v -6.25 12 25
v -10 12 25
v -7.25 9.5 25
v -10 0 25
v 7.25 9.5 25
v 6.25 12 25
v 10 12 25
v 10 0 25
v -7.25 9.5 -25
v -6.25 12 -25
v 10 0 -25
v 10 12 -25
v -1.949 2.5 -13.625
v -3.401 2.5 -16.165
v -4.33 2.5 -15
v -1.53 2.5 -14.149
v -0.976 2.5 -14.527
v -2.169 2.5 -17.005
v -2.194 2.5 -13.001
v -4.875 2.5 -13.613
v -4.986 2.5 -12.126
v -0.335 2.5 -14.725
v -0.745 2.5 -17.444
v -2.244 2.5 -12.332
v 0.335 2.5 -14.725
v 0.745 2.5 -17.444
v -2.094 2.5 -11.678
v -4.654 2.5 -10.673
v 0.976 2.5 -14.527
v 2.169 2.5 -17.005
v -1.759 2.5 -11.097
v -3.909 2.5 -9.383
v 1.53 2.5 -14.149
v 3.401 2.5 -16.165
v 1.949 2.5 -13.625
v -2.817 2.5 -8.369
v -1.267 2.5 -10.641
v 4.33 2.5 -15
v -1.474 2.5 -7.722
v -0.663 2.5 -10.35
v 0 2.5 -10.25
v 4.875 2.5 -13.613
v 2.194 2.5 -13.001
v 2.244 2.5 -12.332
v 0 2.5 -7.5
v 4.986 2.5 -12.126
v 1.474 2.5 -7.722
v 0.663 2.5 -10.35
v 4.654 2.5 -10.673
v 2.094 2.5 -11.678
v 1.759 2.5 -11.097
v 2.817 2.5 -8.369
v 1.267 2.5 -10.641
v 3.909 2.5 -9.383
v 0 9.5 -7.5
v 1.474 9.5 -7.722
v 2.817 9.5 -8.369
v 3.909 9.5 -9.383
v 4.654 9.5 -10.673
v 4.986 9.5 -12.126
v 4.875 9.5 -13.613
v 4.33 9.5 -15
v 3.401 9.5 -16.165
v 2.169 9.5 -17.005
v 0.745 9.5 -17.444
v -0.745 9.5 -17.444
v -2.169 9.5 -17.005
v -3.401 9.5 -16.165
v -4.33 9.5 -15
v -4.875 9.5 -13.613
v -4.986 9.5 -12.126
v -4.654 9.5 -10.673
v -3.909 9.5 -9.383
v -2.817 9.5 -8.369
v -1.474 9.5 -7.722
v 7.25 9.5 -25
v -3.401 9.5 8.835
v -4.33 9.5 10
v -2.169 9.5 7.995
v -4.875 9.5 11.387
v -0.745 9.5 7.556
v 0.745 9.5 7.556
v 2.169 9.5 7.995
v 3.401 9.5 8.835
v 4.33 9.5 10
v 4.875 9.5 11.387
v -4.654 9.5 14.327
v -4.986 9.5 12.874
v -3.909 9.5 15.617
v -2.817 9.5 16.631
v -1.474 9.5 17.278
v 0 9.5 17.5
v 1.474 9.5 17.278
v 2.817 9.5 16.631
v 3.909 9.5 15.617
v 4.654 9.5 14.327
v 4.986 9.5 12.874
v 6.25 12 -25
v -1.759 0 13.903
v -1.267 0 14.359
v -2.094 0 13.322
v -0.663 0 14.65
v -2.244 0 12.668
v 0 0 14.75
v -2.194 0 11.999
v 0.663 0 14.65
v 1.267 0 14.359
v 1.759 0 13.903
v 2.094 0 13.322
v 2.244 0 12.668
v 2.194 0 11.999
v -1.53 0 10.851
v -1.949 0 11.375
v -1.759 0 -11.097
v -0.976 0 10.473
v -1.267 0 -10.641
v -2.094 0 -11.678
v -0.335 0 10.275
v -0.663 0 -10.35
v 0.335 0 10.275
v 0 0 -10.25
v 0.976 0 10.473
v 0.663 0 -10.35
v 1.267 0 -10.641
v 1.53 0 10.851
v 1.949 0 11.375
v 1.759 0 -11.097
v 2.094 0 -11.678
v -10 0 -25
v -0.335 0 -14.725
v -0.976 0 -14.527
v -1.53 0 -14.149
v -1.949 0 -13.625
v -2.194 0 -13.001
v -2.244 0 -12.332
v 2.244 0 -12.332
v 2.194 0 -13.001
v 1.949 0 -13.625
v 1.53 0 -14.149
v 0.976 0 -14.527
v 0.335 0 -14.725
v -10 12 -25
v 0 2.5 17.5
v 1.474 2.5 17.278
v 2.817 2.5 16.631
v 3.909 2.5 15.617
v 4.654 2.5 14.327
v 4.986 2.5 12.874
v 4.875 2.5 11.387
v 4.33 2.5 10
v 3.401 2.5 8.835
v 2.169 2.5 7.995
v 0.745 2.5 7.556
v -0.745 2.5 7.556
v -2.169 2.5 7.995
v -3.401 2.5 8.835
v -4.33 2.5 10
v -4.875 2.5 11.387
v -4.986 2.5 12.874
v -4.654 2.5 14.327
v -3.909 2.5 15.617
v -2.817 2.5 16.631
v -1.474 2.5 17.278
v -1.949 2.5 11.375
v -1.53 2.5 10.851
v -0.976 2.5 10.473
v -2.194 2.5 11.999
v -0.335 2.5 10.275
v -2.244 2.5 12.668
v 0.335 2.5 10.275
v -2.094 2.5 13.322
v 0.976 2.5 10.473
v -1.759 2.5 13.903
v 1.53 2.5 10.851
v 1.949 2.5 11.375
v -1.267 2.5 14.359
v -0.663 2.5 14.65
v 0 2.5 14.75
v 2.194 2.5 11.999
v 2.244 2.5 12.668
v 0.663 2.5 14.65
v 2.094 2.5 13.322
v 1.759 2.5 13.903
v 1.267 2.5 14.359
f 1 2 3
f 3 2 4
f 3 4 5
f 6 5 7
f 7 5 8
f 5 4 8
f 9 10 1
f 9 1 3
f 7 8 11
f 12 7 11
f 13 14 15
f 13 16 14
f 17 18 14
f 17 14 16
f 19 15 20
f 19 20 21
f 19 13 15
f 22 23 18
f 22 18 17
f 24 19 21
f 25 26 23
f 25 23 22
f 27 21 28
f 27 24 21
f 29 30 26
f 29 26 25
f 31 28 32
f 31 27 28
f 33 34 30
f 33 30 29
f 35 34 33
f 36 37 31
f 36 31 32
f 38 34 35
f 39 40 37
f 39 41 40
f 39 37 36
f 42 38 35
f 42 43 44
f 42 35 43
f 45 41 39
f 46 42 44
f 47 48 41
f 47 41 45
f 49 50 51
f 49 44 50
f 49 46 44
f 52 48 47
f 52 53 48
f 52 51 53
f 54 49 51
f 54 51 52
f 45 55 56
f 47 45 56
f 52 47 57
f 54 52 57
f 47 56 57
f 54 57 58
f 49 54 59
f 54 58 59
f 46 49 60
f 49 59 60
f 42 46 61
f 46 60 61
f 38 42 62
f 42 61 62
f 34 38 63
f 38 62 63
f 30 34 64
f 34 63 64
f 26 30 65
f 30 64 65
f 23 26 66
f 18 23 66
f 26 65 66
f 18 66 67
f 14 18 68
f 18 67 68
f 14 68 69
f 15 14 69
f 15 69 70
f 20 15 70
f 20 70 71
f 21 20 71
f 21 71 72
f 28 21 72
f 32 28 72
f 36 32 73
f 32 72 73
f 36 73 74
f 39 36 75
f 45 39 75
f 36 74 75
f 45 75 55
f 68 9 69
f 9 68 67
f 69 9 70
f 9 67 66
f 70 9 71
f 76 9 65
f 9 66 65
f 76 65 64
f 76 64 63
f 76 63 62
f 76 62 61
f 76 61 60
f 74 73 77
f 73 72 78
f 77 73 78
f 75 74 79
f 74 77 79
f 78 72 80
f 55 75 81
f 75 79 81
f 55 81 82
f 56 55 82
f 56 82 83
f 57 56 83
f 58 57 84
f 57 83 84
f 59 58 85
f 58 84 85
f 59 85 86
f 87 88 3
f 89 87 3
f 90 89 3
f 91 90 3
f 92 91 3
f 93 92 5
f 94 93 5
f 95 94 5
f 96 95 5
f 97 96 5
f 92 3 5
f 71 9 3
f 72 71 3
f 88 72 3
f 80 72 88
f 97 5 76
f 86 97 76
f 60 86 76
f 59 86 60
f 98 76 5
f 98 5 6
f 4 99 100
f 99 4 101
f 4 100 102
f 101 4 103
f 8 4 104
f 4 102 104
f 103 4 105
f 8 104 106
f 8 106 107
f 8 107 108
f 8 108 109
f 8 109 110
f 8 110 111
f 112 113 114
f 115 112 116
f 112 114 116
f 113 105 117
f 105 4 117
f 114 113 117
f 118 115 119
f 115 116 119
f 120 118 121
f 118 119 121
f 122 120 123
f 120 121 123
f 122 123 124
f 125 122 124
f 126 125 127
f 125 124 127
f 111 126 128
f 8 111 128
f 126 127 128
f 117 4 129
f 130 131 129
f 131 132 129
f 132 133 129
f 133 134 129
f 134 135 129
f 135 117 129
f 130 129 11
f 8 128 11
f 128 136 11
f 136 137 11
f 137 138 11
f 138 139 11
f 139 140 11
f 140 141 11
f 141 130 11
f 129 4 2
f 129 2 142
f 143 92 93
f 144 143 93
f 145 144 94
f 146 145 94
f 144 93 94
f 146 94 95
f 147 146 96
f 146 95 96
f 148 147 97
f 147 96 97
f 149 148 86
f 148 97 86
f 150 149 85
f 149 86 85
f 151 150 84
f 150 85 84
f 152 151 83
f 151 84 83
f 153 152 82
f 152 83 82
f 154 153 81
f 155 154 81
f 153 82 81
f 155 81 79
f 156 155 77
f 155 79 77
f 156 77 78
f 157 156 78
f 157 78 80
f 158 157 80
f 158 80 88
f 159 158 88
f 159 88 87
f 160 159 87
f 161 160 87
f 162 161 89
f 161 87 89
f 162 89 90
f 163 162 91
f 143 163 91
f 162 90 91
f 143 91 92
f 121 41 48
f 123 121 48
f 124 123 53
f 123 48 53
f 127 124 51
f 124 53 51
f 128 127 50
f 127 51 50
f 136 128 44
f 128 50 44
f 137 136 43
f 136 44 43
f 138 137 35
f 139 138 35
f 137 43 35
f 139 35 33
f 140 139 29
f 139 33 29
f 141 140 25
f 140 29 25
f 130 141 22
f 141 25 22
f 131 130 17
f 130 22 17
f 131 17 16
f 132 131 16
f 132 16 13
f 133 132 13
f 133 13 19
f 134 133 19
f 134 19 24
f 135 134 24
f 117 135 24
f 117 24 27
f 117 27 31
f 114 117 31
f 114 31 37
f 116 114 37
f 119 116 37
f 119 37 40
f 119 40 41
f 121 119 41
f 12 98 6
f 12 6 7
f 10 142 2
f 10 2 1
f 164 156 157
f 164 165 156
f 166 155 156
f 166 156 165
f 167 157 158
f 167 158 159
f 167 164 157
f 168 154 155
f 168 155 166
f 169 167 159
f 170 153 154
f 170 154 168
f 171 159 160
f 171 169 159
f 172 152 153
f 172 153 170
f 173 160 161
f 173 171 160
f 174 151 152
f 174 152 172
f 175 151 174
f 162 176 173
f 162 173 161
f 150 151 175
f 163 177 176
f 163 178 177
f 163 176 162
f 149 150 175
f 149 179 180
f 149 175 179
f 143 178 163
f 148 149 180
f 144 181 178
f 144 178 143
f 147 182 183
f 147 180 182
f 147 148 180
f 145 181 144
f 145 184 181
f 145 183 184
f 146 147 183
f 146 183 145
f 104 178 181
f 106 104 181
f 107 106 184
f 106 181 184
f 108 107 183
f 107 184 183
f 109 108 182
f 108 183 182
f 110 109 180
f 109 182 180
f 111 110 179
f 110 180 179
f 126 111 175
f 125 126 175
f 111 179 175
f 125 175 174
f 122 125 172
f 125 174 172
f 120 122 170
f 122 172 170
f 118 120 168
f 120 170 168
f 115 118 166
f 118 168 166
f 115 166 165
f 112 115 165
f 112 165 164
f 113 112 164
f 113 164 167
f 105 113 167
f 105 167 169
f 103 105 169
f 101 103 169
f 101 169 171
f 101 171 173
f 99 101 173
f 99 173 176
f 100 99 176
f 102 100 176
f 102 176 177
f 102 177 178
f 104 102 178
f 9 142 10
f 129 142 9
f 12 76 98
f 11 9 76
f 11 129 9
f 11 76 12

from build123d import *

# Parameters (mm, degrees)
SKETCH1_W           = 20
SKETCH1_H           = 50
BOSS_EXTRUDE1_DEPTH = 12
CUT_EXTRUDE1_REACH  = 54.383
SKETCH3_R           = 5
CUT_EXTRUDE3_DEPTH  = 7
CUT_EXTRUDE4_REACH  = 30.553
SKETCH4_R           = 2.25


with BuildPart() as part:
    # Sketch1 → Boss-Extrude1 (new body)
    with BuildSketch(Plane(origin=(0, 0, 0), x_dir=(1, 0, 0), z_dir=(0, 1, 0))):
        Rectangle(SKETCH1_W, SKETCH1_H)
    extrude(amount=BOSS_EXTRUDE1_DEPTH)

    # Sketch2 → Cut-Extrude1 (cut, up to next)
    with BuildSketch(Plane.XY.offset(25), mode=Mode.PRIVATE) as cut_extrude1_sk1:
        Polygon((0, 9.5), (7.25, 9.5), (6.25, 12), (0, 12), (-6.25, 12), (-7.25, 9.5), align=None)
    cut_extrude1_tool1 = extrude(cut_extrude1_sk1.sketch, amount=-CUT_EXTRUDE1_REACH, mode=Mode.PRIVATE) & part.part
    add(cut_extrude1_tool1.solids().sort_by_distance((0, 10.719136, 25))[0], mode=Mode.SUBTRACT)

    # Sketch3 → Cut-Extrude3 (cut)
    with BuildSketch(Plane(origin=(0, 9.5, 0), x_dir=(1, 0, 0), z_dir=(0, 1, 0))):
        with Locations(Location((0, 12.5, 0), (0, 0, 270))):
            Circle(SKETCH3_R)
        with Locations(Location((0, -12.5, 0), (0, 0, 270))):
            Circle(SKETCH3_R)
    extrude(amount=-CUT_EXTRUDE3_DEPTH, mode=Mode.SUBTRACT)

    # Sketch4 → Cut-Extrude4 (cut, up to next)
    with BuildSketch(Plane(origin=(0, 2.5, 0), x_dir=(1, 0, 0), z_dir=(0, 1, 0)), mode=Mode.PRIVATE) as cut_extrude4_sk1:
        with Locations(Location((0, 12.5, 0), (0, 0, 270))):
            Circle(SKETCH4_R)
    cut_extrude4_tool1 = extrude(cut_extrude4_sk1.sketch, amount=-CUT_EXTRUDE4_REACH, mode=Mode.PRIVATE) & part.part
    # Sketch4 → Cut-Extrude4 (cut, up to next)
    with BuildSketch(Plane(origin=(0, 2.5, 0), x_dir=(1, 0, 0), z_dir=(0, 1, 0)), mode=Mode.PRIVATE) as cut_extrude4_sk2:
        with Locations(Location((0, -12.5, 0), (0, 0, 270))):
            Circle(SKETCH4_R)
    cut_extrude4_tool2 = extrude(cut_extrude4_sk2.sketch, amount=-CUT_EXTRUDE4_REACH, mode=Mode.PRIVATE) & part.part
    add(cut_extrude4_tool1.solids().sort_by_distance((0, 2.5, -12.5))[0], mode=Mode.SUBTRACT)
    add(cut_extrude4_tool2.solids().sort_by_distance((0, 2.5, 12.5))[0], mode=Mode.SUBTRACT)


solid = part.part
